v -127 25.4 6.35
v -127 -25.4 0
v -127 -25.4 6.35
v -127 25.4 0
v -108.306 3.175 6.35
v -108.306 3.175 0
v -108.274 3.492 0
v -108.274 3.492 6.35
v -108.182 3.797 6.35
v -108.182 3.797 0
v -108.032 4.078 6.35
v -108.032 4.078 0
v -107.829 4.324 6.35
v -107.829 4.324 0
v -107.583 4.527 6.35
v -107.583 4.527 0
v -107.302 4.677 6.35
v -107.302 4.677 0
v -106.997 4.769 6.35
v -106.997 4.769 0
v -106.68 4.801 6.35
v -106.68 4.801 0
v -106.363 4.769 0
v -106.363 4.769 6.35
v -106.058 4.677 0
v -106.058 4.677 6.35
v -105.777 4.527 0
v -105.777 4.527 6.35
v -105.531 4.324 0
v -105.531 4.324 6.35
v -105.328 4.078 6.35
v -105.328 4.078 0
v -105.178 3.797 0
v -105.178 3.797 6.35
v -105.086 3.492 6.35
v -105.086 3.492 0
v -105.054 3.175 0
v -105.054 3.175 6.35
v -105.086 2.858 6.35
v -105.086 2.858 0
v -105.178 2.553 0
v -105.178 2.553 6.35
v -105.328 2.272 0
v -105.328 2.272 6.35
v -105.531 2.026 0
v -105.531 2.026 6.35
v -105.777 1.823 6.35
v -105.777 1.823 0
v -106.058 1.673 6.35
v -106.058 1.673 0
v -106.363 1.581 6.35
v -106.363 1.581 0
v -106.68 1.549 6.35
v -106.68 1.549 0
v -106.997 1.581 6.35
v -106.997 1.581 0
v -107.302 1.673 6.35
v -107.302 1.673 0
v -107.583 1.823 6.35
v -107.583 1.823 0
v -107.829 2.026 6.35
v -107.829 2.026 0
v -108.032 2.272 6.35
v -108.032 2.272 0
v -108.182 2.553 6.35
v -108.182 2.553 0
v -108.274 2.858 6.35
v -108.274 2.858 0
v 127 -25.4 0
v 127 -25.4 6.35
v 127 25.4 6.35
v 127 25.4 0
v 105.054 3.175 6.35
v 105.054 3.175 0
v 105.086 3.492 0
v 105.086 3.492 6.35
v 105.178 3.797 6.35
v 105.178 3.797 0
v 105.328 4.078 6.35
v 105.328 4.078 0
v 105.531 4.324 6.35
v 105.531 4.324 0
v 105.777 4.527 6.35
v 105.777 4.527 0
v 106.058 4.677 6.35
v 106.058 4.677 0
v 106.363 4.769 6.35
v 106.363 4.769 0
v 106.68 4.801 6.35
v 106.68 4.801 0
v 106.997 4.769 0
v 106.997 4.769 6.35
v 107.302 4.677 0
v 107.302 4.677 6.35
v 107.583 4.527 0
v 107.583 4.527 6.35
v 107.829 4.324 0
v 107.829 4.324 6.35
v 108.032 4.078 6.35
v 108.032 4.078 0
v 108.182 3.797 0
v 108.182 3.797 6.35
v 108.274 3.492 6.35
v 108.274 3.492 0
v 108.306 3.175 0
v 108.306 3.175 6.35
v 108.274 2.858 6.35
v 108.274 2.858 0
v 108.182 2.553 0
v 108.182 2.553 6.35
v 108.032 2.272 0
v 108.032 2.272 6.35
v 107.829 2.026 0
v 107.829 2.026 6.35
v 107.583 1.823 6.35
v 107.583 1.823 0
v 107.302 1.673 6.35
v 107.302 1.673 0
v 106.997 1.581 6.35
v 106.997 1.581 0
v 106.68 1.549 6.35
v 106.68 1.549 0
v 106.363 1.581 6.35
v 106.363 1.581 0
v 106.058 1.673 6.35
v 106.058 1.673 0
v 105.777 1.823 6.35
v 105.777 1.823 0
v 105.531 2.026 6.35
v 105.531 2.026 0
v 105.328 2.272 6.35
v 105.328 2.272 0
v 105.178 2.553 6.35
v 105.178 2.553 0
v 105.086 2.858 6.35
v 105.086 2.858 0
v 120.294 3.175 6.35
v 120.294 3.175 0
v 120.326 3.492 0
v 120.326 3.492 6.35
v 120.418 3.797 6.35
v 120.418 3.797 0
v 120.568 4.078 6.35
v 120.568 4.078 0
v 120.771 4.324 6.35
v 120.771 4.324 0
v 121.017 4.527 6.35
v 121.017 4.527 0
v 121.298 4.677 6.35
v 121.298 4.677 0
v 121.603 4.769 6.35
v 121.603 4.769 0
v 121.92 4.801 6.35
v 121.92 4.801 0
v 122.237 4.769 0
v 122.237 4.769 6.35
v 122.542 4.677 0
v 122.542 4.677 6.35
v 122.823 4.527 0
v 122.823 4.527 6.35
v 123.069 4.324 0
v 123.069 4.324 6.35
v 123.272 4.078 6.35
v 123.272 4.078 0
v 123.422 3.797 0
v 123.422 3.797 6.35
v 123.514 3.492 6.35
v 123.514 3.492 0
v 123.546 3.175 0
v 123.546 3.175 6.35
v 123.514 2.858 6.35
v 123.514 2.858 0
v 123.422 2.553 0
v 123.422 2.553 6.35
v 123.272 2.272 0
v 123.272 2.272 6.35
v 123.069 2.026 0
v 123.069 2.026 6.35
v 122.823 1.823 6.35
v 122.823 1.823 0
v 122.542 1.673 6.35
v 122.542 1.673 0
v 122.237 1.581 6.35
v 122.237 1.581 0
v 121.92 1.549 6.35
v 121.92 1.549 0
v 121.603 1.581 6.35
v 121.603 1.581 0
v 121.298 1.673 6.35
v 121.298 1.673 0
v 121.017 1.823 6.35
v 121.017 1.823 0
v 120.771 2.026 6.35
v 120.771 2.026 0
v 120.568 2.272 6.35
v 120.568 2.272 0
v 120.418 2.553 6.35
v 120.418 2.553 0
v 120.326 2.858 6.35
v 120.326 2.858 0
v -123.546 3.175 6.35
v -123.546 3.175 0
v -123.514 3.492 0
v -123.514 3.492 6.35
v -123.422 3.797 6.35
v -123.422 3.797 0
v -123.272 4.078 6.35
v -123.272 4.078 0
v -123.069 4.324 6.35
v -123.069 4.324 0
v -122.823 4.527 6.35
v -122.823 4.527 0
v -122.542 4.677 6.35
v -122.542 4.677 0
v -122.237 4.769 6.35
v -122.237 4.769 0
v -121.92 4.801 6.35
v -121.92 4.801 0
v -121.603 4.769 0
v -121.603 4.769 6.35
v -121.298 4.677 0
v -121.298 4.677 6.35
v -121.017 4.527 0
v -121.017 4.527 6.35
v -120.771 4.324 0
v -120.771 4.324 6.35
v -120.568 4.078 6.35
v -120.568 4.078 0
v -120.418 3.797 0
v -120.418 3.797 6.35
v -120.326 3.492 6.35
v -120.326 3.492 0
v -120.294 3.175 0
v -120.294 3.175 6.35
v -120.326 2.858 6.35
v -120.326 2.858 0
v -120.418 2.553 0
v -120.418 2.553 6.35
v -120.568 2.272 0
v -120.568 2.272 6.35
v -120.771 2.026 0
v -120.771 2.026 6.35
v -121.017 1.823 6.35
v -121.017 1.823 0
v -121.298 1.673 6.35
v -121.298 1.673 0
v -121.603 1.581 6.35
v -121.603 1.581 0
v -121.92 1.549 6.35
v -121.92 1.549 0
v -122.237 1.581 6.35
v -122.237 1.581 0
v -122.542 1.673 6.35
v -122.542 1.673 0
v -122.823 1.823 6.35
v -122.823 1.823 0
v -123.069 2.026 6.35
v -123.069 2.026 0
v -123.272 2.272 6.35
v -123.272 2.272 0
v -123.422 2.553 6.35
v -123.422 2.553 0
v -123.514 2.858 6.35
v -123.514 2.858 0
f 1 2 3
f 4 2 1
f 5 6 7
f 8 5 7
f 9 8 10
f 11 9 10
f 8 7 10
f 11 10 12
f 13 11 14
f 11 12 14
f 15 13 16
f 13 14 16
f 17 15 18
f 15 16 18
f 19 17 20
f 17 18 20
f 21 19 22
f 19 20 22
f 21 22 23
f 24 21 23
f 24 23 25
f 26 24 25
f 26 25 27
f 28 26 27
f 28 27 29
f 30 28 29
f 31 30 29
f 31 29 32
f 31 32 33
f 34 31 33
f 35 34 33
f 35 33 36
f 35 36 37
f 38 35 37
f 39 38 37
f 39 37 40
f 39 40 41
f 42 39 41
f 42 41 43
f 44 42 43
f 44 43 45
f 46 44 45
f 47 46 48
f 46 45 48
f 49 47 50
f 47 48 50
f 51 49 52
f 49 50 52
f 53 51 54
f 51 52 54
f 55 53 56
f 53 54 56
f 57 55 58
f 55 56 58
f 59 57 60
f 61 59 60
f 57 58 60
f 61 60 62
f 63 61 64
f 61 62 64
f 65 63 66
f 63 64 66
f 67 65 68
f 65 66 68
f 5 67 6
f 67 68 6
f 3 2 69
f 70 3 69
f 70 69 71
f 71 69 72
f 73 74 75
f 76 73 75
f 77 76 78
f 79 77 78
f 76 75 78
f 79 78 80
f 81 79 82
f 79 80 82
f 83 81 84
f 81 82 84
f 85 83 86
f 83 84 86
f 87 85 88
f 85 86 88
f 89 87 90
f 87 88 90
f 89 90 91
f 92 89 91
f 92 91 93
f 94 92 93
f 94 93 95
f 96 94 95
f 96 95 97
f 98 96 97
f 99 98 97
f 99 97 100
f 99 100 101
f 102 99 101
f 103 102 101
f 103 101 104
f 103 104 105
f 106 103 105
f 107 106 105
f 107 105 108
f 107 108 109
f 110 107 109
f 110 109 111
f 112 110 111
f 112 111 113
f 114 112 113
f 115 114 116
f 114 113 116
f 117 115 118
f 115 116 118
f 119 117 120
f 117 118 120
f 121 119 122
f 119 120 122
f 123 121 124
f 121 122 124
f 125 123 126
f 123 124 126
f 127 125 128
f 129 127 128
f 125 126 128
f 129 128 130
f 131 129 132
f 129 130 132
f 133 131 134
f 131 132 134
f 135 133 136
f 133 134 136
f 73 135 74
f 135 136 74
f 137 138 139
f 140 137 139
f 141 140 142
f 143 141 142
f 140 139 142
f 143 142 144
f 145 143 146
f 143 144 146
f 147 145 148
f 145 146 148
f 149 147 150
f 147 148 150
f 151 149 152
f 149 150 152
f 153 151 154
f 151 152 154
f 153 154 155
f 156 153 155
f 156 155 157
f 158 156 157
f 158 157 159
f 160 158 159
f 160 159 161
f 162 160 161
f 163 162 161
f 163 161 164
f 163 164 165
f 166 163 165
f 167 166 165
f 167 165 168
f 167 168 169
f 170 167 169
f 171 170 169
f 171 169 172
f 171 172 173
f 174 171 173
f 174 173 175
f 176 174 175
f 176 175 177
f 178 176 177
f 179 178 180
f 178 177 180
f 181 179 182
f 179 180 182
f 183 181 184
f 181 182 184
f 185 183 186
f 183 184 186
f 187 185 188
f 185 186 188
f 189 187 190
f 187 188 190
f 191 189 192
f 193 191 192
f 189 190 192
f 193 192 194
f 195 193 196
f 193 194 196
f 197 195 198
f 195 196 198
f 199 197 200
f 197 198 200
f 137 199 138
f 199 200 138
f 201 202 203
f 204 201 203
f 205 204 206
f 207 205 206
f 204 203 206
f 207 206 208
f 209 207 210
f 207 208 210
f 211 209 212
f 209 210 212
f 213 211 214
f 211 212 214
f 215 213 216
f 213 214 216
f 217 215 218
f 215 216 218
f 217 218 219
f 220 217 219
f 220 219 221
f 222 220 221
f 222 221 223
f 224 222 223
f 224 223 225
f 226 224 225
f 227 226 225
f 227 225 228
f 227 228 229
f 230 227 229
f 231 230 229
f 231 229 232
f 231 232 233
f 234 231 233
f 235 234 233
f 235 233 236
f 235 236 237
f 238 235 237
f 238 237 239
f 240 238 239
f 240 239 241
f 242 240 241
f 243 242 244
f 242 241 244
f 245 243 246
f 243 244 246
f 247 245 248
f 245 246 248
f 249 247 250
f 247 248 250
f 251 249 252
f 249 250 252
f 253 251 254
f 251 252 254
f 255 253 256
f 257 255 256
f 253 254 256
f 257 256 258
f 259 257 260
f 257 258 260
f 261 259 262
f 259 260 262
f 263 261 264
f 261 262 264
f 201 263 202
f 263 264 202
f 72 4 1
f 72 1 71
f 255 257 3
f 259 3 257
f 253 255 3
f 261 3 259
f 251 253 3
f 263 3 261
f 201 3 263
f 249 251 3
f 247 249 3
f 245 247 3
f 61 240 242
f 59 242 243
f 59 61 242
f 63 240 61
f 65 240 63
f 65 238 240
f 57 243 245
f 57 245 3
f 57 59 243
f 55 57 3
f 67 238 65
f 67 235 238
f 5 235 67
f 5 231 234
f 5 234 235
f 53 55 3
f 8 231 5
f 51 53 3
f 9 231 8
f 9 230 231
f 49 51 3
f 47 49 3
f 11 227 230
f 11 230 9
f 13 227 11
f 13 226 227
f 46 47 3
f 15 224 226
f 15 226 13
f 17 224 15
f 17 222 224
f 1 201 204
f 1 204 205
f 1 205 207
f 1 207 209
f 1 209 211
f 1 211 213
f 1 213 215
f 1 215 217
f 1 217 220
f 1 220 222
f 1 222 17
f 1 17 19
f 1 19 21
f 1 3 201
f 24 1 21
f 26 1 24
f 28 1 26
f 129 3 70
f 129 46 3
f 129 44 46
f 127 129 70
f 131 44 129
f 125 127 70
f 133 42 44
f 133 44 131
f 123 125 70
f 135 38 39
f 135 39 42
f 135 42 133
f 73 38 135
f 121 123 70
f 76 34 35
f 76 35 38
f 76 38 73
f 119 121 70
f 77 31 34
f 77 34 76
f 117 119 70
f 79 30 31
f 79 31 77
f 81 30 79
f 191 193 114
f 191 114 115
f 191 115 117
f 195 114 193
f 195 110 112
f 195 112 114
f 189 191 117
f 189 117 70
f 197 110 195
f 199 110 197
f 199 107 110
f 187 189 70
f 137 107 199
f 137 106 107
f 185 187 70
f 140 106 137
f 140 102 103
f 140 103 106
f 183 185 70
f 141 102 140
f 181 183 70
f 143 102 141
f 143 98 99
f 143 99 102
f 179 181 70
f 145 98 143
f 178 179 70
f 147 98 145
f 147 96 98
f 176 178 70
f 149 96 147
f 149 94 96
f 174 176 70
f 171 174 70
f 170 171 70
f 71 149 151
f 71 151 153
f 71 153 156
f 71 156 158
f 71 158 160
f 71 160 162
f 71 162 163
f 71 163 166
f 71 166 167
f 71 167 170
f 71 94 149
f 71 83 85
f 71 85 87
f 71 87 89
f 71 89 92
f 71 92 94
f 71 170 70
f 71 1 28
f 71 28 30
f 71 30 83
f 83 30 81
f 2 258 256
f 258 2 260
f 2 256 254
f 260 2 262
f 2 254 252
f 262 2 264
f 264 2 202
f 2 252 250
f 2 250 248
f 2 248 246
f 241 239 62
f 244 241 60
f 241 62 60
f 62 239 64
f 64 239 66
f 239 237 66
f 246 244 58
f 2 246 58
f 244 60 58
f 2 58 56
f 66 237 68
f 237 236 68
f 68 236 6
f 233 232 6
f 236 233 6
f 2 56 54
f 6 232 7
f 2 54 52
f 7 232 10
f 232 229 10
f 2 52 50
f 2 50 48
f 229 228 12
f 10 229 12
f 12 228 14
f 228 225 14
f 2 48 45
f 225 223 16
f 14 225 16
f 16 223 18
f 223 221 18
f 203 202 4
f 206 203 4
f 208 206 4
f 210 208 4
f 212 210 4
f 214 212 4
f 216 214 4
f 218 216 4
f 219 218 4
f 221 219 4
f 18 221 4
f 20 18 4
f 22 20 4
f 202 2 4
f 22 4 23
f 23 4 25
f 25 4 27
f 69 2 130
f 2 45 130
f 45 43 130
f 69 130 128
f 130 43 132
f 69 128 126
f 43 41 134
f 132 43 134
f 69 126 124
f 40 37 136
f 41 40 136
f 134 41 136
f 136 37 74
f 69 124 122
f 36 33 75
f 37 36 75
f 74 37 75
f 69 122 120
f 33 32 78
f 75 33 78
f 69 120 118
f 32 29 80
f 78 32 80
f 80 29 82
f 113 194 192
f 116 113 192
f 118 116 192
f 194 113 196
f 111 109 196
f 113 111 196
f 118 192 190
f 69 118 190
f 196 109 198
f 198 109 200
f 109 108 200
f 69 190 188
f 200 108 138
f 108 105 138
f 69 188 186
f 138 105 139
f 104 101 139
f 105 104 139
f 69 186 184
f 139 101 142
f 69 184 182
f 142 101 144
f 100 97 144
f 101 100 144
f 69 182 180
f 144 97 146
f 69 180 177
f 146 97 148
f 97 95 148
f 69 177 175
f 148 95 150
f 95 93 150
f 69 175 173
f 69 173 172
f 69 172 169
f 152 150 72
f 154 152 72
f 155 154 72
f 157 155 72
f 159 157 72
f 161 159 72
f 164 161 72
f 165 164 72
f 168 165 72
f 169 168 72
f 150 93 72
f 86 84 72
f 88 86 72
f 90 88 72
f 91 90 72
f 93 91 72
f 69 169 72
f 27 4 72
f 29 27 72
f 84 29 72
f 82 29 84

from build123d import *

# Parameters (mm, degrees)
SKETCH1_W             = 254
SKETCH1_H             = 50.8
BOSS_EXTRUDE1_DEPTH   = 6.35
F_4_CLEARANCE_HOLE1_D = 3.2512
F_4_CLEARANCE_HOLE2_D = 3.2512


with BuildPart() as part:
    # Sketch1 → Boss-Extrude1 (new body)
    with BuildSketch(Plane.XY):
        Rectangle(SKETCH1_W, SKETCH1_H)
    extrude(amount=BOSS_EXTRUDE1_DEPTH)

    # #4 Clearance Hole1 (through all)
    with Locations(Plane.XY.offset(6.35)):
        with Locations((-121.92, 3.175), (-106.68, 3.175)):
            Hole(F_4_CLEARANCE_HOLE1_D / 2)

    # #4 Clearance Hole2 (through all)
    with Locations(Plane.XY.offset(6.35)):
        with Locations((121.92, 3.175), (106.68, 3.175)):
            Hole(F_4_CLEARANCE_HOLE2_D / 2)


solid = part.part
